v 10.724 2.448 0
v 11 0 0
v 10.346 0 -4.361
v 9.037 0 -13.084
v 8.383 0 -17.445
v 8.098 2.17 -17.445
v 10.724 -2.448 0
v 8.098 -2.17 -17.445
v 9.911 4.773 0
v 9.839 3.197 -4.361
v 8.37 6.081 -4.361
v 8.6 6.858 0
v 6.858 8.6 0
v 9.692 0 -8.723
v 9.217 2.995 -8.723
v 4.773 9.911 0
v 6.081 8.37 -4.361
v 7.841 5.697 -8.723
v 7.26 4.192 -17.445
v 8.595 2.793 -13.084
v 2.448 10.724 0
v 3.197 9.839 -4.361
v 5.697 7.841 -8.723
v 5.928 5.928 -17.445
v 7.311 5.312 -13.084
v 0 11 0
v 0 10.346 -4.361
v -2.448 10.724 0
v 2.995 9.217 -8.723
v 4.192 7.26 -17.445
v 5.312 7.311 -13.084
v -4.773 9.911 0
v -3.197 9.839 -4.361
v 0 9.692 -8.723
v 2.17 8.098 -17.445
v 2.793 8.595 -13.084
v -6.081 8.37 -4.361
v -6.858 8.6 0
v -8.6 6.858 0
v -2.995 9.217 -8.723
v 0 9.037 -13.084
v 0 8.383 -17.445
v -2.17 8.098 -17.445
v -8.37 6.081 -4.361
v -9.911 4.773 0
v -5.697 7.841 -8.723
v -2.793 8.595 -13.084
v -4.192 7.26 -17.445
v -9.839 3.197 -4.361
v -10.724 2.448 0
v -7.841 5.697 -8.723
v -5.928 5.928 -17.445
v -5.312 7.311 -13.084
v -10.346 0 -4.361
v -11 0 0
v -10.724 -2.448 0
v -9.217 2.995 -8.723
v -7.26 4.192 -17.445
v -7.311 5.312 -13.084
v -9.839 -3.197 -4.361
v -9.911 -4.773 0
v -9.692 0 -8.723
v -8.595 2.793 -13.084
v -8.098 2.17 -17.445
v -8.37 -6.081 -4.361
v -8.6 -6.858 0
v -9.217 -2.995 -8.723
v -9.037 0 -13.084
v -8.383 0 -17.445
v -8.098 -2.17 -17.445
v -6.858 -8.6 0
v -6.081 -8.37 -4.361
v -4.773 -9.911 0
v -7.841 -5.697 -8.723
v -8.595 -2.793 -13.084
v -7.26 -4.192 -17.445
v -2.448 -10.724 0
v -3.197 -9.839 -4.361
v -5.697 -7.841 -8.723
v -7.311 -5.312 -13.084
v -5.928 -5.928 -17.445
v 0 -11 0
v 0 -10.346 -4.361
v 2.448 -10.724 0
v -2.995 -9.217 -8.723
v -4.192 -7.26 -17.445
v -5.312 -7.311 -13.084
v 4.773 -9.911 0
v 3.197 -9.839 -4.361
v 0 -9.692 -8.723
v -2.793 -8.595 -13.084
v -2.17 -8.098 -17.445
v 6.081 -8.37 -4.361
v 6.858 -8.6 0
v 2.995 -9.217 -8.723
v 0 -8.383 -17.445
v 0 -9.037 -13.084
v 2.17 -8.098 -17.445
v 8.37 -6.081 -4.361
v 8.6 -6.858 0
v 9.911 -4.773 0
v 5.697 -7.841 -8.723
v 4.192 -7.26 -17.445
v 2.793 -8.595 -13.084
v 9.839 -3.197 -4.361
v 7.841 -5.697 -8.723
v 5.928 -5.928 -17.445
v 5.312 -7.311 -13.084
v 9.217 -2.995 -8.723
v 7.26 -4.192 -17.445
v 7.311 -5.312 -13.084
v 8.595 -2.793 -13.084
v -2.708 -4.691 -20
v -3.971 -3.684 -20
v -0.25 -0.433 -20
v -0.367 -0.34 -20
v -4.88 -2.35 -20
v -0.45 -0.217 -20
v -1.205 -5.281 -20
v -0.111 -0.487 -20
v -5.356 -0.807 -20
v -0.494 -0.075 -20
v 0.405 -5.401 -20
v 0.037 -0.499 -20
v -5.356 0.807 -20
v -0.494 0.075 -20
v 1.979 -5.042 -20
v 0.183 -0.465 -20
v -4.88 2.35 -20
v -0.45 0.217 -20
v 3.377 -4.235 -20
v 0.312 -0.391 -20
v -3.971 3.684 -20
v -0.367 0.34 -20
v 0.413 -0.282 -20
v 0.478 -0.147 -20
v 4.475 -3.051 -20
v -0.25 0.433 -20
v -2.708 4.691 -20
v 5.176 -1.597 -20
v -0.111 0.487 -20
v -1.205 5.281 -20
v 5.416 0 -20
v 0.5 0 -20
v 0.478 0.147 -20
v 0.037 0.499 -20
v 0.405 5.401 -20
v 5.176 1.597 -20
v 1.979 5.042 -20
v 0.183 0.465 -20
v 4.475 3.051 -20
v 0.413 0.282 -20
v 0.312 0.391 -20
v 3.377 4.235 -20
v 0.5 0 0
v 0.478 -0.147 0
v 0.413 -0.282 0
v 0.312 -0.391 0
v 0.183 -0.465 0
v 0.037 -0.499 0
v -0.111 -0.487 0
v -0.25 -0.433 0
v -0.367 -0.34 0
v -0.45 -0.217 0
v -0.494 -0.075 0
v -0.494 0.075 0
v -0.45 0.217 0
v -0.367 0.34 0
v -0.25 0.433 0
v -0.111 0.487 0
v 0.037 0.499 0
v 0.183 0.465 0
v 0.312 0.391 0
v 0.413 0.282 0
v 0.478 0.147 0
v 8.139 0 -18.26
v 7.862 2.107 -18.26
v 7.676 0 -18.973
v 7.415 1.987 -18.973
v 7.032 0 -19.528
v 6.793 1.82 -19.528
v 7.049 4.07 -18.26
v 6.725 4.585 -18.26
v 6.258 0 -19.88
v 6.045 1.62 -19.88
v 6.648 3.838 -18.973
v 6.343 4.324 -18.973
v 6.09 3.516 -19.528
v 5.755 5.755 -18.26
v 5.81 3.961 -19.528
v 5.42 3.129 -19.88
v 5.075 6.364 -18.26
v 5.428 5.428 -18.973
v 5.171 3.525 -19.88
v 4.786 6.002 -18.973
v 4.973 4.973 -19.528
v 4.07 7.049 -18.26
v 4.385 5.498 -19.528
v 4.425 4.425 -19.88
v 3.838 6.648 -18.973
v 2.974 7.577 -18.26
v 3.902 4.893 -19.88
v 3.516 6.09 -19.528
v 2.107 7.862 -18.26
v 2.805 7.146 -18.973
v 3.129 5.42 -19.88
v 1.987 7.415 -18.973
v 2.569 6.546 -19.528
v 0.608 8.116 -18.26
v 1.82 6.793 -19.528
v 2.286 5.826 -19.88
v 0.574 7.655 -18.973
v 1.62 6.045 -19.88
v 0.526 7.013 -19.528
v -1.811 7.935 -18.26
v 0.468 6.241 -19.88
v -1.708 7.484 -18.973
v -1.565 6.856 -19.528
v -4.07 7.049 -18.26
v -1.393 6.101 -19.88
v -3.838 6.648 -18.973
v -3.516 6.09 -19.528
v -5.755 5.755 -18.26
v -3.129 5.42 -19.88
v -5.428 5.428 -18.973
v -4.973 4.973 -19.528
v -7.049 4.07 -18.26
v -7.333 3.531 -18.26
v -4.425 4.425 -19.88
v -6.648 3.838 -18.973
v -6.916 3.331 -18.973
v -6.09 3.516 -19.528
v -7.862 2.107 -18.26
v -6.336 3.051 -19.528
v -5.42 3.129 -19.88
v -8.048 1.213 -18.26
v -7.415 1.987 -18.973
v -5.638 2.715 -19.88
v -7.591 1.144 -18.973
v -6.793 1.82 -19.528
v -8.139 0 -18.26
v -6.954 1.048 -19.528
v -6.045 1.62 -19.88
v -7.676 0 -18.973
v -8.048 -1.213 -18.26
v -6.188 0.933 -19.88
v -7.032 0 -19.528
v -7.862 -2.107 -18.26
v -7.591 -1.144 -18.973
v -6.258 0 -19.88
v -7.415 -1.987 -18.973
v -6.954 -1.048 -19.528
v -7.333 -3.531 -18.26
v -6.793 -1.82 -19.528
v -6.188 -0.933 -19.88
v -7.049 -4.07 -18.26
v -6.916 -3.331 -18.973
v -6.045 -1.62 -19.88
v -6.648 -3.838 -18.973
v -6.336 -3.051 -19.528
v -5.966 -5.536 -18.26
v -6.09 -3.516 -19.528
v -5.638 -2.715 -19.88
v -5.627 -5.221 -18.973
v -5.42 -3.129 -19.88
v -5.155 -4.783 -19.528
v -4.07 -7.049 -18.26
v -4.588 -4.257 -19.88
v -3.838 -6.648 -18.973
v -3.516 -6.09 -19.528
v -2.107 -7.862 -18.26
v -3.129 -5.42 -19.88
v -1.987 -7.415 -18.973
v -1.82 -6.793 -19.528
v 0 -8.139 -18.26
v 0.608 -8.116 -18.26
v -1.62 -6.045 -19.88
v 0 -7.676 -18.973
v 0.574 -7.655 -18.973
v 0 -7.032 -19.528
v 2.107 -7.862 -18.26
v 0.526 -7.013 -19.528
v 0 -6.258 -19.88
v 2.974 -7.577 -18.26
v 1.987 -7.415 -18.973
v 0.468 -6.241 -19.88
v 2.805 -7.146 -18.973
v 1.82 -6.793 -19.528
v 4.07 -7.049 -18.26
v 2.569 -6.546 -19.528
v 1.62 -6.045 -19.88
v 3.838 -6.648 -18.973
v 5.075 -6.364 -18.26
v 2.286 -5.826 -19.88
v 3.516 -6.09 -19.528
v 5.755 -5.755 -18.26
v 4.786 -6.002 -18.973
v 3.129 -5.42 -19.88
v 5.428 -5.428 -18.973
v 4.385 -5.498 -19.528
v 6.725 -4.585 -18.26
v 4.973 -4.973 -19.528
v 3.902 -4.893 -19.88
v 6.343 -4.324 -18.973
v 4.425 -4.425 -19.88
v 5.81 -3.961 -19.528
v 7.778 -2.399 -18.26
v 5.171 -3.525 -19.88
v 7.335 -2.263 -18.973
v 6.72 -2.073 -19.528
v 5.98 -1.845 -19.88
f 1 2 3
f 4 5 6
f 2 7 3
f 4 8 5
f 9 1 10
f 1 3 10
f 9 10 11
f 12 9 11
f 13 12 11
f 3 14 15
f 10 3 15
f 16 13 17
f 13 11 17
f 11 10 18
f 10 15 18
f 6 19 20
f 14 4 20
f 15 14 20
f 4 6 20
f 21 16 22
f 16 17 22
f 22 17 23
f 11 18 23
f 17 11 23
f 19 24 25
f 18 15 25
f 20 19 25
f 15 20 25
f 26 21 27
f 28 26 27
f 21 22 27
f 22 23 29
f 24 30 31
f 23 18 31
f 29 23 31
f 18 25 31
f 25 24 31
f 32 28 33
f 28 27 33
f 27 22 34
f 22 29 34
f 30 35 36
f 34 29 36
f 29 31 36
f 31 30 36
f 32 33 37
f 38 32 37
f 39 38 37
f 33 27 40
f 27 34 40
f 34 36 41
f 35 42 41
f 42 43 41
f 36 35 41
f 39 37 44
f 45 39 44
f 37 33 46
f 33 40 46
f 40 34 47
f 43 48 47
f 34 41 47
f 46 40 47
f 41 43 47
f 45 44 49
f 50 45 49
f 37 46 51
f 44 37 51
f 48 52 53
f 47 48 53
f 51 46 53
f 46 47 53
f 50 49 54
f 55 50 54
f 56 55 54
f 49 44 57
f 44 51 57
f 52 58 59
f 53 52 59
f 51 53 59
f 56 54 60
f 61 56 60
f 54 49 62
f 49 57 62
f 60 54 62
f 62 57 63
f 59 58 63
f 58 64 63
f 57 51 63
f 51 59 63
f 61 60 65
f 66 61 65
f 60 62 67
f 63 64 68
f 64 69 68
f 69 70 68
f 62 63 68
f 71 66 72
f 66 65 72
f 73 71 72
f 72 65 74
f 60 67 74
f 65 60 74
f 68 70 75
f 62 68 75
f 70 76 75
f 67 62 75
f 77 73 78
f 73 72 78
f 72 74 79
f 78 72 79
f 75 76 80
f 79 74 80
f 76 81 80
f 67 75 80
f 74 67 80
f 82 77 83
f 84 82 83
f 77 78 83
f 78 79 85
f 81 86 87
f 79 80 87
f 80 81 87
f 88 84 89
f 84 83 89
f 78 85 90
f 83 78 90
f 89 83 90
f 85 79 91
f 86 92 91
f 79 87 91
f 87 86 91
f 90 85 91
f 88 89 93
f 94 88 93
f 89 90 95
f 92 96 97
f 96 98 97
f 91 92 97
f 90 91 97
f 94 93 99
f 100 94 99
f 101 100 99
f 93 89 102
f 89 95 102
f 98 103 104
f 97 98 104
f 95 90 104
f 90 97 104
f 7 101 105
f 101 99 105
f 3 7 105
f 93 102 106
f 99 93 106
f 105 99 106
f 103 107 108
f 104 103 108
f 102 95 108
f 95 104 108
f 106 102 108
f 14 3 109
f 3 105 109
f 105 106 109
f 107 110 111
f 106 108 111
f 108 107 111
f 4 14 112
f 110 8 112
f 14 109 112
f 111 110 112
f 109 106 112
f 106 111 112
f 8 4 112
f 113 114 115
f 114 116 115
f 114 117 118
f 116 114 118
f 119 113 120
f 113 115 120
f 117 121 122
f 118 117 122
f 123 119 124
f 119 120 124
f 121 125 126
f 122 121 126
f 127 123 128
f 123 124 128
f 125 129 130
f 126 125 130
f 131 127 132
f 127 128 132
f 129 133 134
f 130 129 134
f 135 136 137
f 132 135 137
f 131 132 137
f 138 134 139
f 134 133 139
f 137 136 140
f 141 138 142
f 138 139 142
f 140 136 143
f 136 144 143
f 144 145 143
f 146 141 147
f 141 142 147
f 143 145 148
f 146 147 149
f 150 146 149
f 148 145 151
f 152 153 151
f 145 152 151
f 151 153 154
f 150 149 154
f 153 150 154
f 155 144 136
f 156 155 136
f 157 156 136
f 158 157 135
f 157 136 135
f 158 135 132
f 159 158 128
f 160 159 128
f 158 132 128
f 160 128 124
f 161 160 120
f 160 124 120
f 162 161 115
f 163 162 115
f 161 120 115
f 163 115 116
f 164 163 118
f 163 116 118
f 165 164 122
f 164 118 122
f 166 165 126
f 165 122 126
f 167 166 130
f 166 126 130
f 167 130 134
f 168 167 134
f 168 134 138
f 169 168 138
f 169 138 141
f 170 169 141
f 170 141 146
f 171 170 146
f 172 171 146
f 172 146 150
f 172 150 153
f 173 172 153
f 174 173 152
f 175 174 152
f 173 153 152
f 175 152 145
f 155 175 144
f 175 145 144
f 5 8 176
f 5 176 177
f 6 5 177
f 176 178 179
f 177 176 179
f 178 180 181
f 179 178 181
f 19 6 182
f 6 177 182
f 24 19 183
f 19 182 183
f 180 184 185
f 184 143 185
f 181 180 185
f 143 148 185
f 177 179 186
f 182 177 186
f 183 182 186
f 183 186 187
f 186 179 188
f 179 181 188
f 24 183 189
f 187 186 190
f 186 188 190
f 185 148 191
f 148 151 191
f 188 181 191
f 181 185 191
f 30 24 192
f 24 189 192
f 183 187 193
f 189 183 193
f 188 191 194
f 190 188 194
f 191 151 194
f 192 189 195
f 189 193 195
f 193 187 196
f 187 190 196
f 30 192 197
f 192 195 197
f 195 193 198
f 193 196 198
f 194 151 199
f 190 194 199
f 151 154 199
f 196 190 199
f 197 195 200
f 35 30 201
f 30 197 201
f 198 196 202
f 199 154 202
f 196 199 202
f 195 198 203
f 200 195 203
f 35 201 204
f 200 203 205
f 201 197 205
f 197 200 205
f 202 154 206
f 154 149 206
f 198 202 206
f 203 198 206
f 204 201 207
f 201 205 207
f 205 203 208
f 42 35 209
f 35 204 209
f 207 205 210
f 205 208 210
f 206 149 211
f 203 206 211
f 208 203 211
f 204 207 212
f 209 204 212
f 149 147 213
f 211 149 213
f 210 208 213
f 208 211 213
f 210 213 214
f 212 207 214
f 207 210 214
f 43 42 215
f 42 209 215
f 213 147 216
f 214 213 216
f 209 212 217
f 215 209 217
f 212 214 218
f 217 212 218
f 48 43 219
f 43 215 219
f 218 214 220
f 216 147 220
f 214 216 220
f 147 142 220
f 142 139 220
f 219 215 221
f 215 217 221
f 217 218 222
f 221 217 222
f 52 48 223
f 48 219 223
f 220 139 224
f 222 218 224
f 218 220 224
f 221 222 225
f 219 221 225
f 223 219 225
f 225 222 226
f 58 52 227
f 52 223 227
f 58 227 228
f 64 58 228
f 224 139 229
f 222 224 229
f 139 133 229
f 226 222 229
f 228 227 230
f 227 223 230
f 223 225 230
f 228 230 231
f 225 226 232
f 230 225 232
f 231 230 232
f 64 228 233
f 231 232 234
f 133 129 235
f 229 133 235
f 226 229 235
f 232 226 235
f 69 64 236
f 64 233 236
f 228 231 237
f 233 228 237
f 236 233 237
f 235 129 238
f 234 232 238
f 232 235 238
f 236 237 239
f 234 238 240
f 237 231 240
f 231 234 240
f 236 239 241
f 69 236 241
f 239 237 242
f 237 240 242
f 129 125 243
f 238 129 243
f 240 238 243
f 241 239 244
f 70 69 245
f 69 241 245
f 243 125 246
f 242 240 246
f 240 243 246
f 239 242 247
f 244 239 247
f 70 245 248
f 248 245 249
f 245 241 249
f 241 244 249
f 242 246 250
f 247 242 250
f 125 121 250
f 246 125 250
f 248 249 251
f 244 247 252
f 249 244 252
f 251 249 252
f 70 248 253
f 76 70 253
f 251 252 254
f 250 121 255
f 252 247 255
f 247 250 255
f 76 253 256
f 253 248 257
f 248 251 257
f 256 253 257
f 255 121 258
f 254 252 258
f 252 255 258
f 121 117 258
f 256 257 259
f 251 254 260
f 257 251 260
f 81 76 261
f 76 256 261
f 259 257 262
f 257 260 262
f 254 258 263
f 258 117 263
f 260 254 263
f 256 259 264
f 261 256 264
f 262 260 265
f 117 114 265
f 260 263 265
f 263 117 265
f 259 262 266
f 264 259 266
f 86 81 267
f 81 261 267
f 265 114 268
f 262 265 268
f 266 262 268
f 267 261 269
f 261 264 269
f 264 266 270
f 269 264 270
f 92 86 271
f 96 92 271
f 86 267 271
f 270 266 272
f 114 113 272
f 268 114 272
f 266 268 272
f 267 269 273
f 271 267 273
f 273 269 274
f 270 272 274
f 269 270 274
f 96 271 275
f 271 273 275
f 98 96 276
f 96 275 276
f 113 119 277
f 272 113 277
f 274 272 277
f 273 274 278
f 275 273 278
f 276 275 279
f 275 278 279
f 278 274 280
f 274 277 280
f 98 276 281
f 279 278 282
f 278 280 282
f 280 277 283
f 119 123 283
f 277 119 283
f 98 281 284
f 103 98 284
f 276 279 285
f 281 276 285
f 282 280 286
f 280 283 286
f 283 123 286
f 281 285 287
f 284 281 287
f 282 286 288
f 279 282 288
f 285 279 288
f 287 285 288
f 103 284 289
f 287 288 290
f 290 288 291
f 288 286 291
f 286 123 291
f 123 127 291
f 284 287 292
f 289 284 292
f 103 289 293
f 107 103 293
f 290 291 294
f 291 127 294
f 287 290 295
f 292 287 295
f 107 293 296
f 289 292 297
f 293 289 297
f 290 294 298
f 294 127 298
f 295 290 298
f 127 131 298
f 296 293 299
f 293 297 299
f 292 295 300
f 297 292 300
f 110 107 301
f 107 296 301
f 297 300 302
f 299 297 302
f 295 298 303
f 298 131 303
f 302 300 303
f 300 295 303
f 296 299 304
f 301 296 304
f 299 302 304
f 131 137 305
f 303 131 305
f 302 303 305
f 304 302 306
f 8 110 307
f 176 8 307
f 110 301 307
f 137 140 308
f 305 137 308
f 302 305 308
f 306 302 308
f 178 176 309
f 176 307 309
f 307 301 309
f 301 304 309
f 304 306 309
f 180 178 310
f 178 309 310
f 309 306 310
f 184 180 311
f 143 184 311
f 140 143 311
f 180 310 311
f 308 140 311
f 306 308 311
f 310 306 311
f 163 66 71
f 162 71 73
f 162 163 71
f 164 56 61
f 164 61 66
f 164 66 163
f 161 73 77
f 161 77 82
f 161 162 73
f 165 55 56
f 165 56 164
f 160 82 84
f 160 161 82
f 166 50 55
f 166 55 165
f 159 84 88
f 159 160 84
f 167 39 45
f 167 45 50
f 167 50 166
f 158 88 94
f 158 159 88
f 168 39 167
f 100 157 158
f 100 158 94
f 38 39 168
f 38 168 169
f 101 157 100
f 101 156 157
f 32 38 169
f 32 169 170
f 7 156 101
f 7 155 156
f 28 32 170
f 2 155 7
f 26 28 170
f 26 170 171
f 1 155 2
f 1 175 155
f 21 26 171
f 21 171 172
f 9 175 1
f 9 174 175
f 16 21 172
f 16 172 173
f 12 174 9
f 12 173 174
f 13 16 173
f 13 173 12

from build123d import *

# Parameters (mm, degrees)
F0_R     = 11
F2_R     = 8
F4_R     = 3
F5_R     = 0.5
F6_DEPTH = 20


with BuildPart() as f3:
    # F0 (on Top) → F3 section 0
    with BuildSketch(Plane.XY):
        Circle(F0_R)
    # F2 (on offset) → F3 section 1
    with BuildSketch(Plane.XY.offset(-20)):
        Circle(F2_R)
    loft()

    # F4
    f4_edges = [f3.edges().sort_by_distance(p)[0] for p in [
        (-8, 0, -20),
    ]]
    fillet(f4_edges, radius=F4_R)

    # F5 (on face) → F6 (cut)
    with BuildSketch(Plane(origin=(0, 0, -20), x_dir=(1, 0, 0), z_dir=(0, 0, -1))):
        Circle(F5_R)
    extrude(amount=-F6_DEPTH, mode=Mode.SUBTRACT)


solid = f3.part
